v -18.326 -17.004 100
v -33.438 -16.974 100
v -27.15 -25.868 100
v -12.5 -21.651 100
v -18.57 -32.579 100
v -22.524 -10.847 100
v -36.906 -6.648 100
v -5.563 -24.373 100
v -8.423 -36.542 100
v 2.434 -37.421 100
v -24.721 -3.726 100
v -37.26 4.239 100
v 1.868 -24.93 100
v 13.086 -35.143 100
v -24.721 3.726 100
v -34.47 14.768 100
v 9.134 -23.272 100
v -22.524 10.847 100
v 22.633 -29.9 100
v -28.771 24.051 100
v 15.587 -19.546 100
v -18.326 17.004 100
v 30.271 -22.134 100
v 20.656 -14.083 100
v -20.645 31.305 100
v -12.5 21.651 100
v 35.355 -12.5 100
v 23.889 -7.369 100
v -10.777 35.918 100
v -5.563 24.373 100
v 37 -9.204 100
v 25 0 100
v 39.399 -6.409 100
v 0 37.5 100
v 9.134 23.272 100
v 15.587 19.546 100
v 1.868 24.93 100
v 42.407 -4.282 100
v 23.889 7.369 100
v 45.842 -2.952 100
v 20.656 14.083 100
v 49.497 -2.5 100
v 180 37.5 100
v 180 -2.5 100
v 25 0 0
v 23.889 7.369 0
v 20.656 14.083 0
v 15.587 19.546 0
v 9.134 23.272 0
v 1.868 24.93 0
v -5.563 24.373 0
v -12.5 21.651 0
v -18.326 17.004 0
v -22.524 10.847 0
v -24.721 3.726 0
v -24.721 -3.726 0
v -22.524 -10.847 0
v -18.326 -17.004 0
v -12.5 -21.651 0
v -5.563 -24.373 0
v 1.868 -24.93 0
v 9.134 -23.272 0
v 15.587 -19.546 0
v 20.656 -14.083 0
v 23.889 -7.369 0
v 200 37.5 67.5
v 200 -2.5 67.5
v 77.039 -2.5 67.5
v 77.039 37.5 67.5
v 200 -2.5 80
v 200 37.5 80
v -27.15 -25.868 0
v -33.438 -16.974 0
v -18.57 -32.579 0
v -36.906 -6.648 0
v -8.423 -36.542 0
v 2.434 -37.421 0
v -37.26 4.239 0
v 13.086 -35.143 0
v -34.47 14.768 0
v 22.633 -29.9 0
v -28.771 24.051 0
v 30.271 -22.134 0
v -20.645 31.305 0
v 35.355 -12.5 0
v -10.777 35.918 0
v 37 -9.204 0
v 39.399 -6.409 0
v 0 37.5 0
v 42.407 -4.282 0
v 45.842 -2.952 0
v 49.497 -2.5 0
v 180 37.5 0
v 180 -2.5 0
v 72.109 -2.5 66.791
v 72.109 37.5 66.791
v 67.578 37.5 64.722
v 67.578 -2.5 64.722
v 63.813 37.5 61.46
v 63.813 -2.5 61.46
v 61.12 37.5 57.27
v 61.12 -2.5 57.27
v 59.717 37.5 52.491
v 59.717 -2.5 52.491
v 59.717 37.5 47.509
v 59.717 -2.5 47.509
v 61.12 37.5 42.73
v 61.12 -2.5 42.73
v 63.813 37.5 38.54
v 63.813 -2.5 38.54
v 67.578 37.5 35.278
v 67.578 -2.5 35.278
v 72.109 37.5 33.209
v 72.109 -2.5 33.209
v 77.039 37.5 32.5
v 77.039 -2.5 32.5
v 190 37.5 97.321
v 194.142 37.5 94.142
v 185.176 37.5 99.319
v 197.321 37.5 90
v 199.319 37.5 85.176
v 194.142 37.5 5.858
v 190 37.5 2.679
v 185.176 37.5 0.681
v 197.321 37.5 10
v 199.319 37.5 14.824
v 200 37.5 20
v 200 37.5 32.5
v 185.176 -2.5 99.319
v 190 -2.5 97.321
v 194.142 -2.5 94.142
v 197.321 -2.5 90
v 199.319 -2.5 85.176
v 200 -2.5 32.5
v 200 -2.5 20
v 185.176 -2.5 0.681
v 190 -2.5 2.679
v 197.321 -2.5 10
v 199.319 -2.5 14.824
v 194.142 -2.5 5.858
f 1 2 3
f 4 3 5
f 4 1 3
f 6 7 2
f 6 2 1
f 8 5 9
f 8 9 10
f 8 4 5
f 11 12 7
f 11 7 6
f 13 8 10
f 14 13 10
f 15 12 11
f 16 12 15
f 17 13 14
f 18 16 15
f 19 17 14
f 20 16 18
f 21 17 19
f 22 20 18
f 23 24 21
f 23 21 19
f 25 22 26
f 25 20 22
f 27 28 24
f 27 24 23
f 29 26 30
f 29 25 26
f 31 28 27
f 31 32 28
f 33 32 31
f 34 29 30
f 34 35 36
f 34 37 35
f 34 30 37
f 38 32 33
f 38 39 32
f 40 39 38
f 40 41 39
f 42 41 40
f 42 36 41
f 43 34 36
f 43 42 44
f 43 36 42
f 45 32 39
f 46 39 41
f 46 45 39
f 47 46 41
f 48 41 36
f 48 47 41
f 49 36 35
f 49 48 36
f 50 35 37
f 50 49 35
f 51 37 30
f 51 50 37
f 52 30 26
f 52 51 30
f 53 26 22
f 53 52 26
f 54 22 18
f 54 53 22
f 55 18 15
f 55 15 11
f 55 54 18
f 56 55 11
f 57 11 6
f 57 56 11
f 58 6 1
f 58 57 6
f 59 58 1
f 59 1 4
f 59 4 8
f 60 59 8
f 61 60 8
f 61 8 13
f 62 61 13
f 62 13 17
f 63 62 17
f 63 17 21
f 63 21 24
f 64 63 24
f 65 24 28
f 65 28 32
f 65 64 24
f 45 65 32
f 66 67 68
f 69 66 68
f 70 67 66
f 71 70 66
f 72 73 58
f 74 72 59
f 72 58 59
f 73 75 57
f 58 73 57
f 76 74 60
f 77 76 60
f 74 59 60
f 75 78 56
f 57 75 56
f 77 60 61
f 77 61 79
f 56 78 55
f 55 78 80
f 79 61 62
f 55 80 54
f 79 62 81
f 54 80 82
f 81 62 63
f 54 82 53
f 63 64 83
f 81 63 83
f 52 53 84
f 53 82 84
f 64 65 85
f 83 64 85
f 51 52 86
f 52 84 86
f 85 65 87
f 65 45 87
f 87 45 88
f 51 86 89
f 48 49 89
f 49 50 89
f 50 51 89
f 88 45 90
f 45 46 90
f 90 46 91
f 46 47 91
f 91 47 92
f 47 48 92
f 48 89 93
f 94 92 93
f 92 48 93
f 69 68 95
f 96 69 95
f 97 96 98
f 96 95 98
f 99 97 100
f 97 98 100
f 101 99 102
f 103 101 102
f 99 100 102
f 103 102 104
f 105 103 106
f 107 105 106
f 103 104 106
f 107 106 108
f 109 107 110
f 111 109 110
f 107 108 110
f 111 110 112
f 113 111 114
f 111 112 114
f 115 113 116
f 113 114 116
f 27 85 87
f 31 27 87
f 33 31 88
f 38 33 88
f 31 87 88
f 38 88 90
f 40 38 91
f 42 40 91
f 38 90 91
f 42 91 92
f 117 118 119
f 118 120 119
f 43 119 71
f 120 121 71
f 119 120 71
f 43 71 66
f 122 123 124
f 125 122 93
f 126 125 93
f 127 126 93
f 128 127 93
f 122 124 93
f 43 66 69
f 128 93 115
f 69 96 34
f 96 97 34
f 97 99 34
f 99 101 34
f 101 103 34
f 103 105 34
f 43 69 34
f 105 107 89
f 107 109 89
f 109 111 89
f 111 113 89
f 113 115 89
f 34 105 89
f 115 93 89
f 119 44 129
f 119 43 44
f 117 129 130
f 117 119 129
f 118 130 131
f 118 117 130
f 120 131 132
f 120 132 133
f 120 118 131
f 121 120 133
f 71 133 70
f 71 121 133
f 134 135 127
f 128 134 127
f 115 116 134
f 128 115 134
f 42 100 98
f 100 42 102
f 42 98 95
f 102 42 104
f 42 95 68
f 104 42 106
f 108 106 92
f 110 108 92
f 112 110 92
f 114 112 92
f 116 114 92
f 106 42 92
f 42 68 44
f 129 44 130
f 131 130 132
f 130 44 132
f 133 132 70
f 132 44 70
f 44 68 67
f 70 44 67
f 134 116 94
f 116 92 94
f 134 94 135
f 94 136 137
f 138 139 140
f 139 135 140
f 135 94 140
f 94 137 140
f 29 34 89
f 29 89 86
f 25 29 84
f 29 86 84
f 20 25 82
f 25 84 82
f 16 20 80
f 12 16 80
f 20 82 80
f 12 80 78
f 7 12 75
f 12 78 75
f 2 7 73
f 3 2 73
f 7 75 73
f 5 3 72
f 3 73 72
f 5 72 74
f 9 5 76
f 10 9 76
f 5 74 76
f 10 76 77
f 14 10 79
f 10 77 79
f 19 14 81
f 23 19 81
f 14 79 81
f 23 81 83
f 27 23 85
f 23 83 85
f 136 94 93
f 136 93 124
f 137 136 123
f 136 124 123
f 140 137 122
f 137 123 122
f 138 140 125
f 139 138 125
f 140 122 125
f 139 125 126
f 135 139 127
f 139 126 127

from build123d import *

# Parameters (mm, degrees)
F0_R     = 25
F1_DEPTH = 100
F3_DEPTH = 50
F4_R     = 20


with BuildPart() as f1:
    # F0 (on Top) → F1 (new body)
    with BuildSketch(Plane.XY):
        with BuildLine():
            Line((200, 37.5), (0, 37.5))
            ThreePointArc((0, 37.5), (-30.618622, -21.650635), (35.355339, -12.5))
            ThreePointArc((35.355339, -12.5), (40.837221, -5.252551), (49.497475, -2.5))
            Line((49.497475, -2.5), (200, -2.5))
            Line((200, -2.5), (200, 37.5))
        make_face()
        Circle(F0_R, mode=Mode.SUBTRACT)
    extrude(amount=F1_DEPTH)

    # F2 (on face) → F3 (cut)
    with BuildSketch(Plane.XZ.offset(2.5)):
        with BuildLine():
            Line((200, 67.5), (77.039003, 67.5))
            ThreePointArc((77.039003, 67.5), (59.539003, 50), (77.039003, 32.5))
            Line((77.039003, 32.5), (200, 32.5))
            Line((200, 32.5), (200, 67.5))
        make_face()
    extrude(amount=-F3_DEPTH, mode=Mode.SUBTRACT)

    # F4
    f4_edges = [f1.edges().sort_by_distance(p)[0] for p in [
        (200, 17.5, 100),
        (200, 17.5, 0),
    ]]
    fillet(f4_edges, radius=F4_R)


solid = f1.part
